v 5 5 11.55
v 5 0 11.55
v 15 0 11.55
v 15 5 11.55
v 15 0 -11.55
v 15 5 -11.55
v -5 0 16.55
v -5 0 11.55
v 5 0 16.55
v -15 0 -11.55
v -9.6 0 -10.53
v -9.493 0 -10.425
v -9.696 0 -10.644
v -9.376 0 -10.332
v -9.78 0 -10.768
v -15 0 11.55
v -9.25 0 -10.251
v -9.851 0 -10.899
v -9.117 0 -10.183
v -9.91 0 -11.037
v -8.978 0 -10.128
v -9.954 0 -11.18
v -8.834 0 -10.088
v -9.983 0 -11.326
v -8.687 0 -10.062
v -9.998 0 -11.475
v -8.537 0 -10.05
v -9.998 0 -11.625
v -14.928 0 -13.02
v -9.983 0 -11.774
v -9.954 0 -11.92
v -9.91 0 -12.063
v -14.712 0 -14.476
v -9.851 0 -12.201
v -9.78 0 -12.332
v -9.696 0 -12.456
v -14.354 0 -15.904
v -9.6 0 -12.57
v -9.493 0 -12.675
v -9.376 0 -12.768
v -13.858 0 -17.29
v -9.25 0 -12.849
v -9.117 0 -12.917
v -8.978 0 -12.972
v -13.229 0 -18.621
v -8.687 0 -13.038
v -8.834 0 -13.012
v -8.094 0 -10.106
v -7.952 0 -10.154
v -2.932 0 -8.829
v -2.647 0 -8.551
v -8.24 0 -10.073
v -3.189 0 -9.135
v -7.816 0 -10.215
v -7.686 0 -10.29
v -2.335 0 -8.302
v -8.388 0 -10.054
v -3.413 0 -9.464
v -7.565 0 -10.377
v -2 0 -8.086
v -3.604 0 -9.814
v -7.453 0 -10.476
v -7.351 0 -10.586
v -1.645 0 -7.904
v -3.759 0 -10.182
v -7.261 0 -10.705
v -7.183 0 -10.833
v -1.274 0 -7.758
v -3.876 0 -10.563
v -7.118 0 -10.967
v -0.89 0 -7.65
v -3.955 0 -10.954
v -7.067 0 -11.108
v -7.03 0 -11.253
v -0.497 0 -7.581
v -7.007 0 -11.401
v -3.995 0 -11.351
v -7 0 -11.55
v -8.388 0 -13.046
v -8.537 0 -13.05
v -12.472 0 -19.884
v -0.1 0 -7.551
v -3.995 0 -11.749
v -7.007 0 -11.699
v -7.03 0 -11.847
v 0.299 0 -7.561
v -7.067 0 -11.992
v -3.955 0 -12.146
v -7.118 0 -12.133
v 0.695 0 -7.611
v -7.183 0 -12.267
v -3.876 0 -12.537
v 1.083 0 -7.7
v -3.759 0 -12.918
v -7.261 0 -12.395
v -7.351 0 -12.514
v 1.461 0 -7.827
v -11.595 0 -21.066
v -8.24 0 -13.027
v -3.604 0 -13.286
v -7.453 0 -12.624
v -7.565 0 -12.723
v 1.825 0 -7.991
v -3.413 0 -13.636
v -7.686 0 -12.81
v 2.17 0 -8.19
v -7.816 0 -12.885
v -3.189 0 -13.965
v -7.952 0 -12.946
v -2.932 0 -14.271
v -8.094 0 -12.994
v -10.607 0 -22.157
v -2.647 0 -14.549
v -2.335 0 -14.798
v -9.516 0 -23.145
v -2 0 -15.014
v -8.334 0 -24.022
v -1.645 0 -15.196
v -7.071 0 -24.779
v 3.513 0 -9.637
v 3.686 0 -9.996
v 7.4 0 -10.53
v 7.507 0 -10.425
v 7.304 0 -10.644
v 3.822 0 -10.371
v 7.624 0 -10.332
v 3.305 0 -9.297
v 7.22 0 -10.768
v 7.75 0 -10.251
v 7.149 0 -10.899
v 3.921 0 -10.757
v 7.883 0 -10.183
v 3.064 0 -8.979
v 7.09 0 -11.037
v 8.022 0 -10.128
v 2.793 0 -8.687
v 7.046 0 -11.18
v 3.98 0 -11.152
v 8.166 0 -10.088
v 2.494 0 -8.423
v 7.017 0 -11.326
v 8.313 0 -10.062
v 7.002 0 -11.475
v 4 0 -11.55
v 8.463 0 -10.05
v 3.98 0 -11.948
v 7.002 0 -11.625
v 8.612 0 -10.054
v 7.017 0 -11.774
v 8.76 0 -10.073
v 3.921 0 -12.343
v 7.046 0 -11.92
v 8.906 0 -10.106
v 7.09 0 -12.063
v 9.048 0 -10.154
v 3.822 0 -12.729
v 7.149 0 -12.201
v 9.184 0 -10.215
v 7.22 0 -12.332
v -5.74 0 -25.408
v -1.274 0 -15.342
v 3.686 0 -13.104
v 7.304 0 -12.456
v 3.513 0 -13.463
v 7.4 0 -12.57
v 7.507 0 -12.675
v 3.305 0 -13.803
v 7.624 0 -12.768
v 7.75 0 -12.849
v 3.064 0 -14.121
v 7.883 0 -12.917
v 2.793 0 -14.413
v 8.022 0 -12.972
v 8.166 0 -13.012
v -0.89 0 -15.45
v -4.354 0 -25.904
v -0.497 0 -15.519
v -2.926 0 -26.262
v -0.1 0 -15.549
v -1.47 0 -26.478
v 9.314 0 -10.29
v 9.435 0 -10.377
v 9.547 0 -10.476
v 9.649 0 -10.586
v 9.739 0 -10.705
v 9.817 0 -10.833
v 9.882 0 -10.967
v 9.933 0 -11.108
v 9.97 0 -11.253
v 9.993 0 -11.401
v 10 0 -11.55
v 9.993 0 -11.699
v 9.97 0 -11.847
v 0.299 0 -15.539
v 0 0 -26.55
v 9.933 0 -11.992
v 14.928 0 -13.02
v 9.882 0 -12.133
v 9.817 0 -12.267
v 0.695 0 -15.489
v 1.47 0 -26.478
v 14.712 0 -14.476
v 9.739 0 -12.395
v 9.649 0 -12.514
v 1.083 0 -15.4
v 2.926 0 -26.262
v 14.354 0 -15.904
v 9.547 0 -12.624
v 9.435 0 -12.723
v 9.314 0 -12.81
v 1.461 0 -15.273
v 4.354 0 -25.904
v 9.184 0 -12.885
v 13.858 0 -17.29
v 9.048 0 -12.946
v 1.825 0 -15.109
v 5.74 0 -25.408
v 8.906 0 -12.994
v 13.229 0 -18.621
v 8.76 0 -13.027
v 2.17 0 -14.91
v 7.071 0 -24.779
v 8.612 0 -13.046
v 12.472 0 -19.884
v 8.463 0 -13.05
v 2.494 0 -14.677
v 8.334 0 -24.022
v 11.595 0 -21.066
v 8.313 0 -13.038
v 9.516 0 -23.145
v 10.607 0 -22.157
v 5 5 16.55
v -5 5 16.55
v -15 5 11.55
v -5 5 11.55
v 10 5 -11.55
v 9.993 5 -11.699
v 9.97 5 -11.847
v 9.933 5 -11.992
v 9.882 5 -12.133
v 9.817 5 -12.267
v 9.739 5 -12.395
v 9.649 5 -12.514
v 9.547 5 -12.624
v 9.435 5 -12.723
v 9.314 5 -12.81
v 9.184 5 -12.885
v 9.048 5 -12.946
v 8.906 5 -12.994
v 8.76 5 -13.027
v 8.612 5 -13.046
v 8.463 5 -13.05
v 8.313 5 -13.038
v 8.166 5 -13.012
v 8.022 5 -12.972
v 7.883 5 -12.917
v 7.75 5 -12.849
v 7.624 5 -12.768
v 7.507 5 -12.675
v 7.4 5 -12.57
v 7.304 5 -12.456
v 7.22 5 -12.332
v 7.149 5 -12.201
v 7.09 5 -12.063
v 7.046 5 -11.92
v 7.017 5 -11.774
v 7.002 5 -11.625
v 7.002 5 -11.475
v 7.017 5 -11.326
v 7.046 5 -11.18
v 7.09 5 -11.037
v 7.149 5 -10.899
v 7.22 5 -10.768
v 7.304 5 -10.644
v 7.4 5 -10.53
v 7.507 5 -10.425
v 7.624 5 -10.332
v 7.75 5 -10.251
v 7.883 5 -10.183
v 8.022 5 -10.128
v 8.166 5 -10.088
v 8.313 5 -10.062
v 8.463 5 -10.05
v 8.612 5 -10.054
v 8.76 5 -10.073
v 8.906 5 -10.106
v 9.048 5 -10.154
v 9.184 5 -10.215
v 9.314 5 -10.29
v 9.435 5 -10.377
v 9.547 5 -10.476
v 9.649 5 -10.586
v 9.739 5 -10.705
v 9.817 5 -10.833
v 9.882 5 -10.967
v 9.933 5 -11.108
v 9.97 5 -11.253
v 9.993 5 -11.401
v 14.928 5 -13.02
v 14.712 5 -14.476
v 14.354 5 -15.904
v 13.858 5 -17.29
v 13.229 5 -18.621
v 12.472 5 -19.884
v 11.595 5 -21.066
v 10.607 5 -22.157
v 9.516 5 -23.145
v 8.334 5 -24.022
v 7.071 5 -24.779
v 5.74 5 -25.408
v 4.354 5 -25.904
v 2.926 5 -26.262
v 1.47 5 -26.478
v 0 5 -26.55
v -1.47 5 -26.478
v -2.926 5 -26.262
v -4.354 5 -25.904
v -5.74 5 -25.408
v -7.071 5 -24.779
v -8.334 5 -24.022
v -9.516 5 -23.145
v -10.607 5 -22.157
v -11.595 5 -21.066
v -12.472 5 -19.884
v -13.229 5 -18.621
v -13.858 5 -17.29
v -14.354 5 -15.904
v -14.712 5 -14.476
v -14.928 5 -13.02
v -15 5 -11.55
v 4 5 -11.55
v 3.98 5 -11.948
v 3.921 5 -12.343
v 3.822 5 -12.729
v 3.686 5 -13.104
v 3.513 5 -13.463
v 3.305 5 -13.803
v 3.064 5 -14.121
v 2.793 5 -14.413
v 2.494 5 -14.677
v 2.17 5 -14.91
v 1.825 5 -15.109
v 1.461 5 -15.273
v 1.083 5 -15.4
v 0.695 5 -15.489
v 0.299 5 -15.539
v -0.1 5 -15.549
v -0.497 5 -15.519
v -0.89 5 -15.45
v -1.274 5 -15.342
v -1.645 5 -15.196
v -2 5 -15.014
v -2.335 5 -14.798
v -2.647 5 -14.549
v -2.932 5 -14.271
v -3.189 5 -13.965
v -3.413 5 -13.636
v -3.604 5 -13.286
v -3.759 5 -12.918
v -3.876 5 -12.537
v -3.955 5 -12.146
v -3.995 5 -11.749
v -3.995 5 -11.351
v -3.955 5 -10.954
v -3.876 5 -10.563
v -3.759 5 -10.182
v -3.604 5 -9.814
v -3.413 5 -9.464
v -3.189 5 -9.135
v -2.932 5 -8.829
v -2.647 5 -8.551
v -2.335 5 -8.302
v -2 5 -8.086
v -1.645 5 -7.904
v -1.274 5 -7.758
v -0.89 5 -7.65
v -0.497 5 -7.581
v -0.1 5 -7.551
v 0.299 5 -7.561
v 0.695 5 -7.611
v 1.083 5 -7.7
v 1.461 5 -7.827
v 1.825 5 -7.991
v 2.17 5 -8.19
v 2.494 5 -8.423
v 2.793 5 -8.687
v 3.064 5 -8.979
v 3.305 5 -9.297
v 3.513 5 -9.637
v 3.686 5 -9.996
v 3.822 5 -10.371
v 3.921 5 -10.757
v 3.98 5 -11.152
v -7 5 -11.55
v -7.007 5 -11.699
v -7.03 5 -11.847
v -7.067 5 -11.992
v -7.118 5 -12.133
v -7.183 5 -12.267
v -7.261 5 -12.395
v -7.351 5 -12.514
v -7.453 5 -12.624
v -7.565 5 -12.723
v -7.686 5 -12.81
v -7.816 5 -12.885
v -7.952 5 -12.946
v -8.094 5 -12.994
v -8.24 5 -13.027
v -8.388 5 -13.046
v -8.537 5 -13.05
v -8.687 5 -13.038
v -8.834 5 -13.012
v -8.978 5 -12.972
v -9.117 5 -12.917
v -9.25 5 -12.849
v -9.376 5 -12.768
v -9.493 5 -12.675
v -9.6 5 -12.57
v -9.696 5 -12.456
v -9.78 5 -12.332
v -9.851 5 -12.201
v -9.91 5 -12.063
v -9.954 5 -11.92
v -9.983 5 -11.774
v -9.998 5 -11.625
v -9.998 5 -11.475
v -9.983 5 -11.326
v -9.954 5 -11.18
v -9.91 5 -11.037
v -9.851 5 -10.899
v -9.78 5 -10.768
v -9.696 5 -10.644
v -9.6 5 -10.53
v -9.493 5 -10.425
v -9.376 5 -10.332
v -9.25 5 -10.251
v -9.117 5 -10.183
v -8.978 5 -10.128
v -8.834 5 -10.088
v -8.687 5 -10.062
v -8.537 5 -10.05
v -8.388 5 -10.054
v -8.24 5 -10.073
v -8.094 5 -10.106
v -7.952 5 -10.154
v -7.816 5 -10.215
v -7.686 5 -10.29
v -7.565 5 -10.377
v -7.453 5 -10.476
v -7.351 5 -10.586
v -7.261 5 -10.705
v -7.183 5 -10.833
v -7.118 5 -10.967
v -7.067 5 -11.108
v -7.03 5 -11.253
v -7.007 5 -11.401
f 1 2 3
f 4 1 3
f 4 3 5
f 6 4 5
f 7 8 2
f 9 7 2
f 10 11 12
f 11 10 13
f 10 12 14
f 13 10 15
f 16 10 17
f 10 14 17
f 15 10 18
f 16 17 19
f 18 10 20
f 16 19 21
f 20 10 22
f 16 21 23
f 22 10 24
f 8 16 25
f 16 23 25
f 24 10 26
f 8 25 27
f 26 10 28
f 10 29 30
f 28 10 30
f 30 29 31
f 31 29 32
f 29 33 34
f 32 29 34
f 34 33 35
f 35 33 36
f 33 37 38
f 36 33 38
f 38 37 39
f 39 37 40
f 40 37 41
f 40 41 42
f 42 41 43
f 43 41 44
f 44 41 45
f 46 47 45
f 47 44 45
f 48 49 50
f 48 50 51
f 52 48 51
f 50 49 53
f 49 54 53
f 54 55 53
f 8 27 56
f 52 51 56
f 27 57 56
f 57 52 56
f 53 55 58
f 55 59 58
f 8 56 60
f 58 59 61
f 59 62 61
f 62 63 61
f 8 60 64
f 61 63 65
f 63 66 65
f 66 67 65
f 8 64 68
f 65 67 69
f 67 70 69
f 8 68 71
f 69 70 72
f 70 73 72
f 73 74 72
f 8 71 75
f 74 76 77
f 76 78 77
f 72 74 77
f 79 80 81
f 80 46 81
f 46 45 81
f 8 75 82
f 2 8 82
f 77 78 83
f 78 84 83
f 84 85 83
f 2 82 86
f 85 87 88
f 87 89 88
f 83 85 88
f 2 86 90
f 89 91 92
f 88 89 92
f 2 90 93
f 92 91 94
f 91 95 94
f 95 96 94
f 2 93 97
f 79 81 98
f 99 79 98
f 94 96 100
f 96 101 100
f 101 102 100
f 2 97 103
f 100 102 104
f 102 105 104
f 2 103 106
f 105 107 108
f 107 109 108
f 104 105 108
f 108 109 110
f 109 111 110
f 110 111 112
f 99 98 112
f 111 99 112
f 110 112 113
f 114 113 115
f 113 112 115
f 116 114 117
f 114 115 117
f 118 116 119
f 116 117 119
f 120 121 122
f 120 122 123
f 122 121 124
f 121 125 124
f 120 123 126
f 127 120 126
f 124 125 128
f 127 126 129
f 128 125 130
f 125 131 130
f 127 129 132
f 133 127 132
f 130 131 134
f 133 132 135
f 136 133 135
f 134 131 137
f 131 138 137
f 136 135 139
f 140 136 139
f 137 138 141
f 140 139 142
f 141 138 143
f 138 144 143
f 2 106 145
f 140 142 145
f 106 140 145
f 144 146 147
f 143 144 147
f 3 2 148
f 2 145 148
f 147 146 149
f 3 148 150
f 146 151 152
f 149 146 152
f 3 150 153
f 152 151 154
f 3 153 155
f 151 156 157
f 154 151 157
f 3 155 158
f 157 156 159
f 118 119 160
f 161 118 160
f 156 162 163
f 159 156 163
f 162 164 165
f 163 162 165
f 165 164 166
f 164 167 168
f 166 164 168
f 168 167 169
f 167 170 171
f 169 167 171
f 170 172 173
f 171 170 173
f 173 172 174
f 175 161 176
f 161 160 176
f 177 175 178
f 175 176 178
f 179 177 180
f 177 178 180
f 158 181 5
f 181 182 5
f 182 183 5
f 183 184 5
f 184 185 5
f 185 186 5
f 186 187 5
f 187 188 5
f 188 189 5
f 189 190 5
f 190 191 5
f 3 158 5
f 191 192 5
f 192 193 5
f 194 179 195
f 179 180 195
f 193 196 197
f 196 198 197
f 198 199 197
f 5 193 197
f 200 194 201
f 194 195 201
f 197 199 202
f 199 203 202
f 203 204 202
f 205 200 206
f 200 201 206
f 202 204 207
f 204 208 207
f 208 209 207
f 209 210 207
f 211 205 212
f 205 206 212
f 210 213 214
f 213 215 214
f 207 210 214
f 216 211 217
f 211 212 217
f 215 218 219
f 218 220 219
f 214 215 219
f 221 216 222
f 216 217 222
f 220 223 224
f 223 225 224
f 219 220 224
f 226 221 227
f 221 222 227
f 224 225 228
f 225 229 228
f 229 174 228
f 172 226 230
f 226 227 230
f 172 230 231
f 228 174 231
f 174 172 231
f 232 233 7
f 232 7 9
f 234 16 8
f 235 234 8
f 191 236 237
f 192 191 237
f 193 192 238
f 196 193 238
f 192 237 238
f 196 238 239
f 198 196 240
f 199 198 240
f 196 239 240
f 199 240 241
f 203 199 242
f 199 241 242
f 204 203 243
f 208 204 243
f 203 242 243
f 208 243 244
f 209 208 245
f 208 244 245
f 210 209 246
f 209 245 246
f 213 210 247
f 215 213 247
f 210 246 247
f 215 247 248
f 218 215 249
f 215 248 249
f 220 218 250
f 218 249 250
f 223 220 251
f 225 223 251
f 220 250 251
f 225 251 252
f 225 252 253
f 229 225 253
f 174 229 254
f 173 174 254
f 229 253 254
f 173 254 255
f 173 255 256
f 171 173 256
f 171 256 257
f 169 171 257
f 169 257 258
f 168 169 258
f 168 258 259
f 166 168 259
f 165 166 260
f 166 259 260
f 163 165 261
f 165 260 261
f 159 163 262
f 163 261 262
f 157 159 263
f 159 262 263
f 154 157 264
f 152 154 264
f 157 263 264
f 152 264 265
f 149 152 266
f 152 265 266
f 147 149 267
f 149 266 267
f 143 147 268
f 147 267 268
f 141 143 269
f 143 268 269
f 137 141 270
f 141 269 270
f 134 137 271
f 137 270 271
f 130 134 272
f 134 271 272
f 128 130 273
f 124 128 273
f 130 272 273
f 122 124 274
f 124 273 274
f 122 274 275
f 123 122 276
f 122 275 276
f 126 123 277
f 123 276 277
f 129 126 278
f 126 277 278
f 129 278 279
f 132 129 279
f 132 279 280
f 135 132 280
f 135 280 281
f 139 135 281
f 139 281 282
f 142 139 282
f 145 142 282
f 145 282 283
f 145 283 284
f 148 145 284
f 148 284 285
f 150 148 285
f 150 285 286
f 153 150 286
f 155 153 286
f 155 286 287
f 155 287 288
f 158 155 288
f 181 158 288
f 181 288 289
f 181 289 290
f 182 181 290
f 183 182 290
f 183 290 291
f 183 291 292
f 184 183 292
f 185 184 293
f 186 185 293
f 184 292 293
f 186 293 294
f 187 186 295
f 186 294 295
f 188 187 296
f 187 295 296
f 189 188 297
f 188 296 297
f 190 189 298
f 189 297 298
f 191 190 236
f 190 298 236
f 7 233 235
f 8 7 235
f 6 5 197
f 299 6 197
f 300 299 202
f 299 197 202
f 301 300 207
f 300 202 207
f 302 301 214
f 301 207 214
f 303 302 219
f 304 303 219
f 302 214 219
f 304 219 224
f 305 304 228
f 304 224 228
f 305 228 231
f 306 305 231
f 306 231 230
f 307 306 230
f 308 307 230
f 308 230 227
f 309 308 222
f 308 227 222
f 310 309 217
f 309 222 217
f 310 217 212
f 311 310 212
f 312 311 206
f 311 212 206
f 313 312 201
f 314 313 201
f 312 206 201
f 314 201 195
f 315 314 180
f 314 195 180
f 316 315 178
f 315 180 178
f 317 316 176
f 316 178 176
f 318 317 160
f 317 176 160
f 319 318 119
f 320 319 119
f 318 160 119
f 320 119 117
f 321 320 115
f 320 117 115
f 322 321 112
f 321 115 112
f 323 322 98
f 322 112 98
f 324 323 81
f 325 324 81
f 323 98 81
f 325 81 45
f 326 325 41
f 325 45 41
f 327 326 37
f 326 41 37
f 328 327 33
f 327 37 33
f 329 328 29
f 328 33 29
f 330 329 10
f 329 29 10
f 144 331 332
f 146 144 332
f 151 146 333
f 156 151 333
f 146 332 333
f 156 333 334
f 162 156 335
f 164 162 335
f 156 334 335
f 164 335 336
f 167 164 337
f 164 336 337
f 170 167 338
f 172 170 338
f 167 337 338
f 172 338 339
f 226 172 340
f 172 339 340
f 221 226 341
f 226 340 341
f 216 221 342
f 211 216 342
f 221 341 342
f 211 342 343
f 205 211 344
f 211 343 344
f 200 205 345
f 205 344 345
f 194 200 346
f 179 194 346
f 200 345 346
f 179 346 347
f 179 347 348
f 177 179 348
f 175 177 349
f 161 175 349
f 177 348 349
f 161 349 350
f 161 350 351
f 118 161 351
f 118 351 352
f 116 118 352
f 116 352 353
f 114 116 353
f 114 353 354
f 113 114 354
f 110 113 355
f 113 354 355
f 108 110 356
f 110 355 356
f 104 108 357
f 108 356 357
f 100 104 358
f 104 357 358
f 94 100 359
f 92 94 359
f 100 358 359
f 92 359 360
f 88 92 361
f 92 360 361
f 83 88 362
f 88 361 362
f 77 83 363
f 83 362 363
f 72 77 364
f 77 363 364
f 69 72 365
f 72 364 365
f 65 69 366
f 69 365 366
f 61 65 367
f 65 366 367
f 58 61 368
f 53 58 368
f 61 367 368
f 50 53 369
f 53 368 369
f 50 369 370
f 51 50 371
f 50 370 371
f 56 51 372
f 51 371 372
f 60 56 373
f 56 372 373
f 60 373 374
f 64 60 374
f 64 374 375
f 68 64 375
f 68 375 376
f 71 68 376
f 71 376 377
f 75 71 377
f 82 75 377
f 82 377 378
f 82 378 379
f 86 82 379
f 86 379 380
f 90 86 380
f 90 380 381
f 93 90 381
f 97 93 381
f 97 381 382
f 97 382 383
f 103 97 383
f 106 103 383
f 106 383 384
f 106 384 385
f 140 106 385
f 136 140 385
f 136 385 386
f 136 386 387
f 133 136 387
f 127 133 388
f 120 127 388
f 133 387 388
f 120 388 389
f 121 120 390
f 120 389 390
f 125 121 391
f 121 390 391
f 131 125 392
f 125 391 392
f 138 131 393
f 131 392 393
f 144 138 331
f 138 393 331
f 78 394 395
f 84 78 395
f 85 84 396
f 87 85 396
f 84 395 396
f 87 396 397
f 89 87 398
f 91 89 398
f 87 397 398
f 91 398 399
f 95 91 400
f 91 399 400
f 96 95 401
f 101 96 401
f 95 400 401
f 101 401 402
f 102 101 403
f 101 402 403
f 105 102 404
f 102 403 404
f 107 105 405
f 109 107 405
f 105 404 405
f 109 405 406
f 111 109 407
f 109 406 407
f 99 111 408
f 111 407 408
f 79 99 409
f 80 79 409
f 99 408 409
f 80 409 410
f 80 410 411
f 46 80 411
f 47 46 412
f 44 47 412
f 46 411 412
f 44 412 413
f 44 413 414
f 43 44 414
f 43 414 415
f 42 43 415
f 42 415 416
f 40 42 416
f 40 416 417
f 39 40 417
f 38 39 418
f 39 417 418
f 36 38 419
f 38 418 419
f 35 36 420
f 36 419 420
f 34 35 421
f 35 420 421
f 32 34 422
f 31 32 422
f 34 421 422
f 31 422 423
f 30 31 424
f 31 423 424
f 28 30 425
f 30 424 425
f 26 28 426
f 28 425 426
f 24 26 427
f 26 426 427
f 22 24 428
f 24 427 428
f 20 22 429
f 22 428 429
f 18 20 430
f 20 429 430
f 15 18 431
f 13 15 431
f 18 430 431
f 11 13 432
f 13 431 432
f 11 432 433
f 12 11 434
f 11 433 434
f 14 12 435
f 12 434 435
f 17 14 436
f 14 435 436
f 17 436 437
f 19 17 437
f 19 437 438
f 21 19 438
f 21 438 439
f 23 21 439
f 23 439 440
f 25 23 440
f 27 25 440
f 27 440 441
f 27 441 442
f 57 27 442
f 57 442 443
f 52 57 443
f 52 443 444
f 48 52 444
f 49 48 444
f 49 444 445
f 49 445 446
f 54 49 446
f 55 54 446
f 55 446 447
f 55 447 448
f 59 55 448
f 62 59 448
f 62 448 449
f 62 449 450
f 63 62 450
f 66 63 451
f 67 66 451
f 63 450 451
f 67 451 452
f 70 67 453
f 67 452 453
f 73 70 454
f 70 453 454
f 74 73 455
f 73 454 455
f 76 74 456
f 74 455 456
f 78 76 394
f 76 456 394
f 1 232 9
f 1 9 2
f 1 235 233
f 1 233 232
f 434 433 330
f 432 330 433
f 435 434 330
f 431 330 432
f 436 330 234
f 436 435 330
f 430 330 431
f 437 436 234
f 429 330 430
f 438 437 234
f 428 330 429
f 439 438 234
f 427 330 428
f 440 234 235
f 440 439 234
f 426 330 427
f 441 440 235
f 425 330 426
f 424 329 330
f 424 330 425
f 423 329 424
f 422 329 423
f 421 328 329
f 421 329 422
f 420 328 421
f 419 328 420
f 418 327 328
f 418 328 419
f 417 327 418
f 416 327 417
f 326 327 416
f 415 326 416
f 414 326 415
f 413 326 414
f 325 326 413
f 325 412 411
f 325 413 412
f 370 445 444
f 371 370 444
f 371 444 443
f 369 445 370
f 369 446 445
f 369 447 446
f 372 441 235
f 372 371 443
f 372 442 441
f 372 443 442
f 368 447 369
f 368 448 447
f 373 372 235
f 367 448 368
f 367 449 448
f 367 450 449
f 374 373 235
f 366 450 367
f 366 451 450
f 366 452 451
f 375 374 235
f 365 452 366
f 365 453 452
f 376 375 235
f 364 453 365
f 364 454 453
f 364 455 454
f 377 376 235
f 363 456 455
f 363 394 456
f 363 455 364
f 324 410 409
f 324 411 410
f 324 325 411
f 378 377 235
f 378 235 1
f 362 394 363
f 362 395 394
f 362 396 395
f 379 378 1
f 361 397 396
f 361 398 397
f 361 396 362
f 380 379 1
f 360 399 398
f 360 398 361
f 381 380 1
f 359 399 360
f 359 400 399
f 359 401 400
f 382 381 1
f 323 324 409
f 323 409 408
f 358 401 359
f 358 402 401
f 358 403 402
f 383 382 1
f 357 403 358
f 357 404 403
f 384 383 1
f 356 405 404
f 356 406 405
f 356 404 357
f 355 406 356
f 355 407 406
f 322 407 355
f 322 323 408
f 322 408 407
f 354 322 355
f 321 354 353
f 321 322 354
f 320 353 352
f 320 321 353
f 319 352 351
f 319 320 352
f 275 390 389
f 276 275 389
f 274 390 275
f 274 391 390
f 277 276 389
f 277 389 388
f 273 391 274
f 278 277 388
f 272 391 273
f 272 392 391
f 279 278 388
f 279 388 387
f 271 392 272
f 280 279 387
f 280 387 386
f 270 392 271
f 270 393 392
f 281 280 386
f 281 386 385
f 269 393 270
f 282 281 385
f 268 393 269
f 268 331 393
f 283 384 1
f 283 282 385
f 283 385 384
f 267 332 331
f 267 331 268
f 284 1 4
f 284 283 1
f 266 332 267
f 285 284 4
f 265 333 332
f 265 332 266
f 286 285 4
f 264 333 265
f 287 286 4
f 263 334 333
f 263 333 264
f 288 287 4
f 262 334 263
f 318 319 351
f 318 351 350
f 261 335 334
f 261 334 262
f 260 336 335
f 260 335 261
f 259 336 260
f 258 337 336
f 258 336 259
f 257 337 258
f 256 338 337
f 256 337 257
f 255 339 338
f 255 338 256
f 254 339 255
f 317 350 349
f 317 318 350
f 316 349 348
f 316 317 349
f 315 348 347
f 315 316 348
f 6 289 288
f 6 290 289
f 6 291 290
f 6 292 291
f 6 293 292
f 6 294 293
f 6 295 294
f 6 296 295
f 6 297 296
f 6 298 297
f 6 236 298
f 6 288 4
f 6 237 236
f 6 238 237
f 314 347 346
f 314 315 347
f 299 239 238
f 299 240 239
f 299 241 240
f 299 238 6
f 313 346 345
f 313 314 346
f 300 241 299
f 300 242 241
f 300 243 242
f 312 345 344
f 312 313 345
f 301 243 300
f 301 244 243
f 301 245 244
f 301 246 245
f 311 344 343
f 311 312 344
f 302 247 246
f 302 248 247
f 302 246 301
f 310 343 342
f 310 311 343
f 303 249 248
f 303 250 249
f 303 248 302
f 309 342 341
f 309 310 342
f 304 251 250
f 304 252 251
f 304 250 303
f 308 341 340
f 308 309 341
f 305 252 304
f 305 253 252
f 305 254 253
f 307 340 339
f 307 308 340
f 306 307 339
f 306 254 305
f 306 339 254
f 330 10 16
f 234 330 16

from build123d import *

# Parameters (mm, degrees)
EXTRUDE_1_DEPTH = 5
SKETCH_2_R      = 12.5
SKETCH_2_R_2    = 1.5
SKETCH_2_R_3    = 4
EXTRUDE_2_DEPTH = 5
SKETCH_3_W      = 10
SKETCH_3_H      = 5
EXTRUDE_3_DEPTH = 5


with BuildPart() as part:
    # 草图1 → 凸台-拉伸1 (new body)
    with BuildSketch(Plane(origin=(0, 0, 0), x_dir=(1, 0, 0), z_dir=(0, 1, 0))):
        with BuildLine():
            ThreePointArc((15, 11.55), (0, 26.55), (-15, 11.55))
            Line((-15, 11.55), (-12.5, 11.55))
            ThreePointArc((-12.5, 11.55), (0, 24.05), (12.5, 11.55))
            Line((12.5, 11.55), (15, 11.55))
        make_face()
        with BuildLine():
            Line((-12.5, 11.55), (-15, 11.55))
            ThreePointArc((-15, 11.55), (0, -3.45), (15, 11.55))
            Line((15, 11.55), (12.5, 11.55))
            ThreePointArc((12.5, 11.55), (0, -0.95), (-12.5, 11.55))
        make_face()
        with BuildLine():
            ThreePointArc((15, 11.55), (0, 26.55), (-15, 11.55))
            Line((-15, 11.55), (-12.5, 11.55))
            ThreePointArc((-12.5, 11.55), (0, 24.05), (12.5, 11.55))
            Line((12.5, 11.55), (15, 11.55))
        make_face()
        with BuildLine():
            Line((-12.5, 11.55), (-15, 11.55))
            ThreePointArc((-15, 11.55), (0, -3.45), (15, 11.55))
            Line((15, 11.55), (12.5, 11.55))
            ThreePointArc((12.5, 11.55), (0, -0.95), (-12.5, 11.55))
        make_face()
        with BuildLine():
            Line((-15, 11.55), (-15, -11.55))
            Line((-15, -11.55), (15, -11.55))
            Line((15, -11.55), (15, 11.55))
            ThreePointArc((15, 11.55), (0, -3.45), (-15, 11.55))
        make_face()
    extrude(amount=EXTRUDE_1_DEPTH)

    # 草图2 → 凸台-拉伸2 (add)
    with BuildSketch(Plane(origin=(0, 5, 0), x_dir=(1, 0, 0), z_dir=(0, 1, 0))):
        with Locations((0, 11.55)):
            Circle(SKETCH_2_R)
        with Locations((-8.5, 11.55)):
            Circle(SKETCH_2_R_2, mode=Mode.SUBTRACT)
        with Locations((8.5, 11.55)):
            Circle(SKETCH_2_R_2, mode=Mode.SUBTRACT)
        with Locations((0, 11.55)):
            Circle(SKETCH_2_R_3, mode=Mode.SUBTRACT)
    extrude(amount=-EXTRUDE_2_DEPTH)

    # 草图3 → 凸台-拉伸3 (add)
    with BuildSketch(Plane(origin=(0, 5, 0), x_dir=(1, 0, 0), z_dir=(0, 1, 0))):
        with Locations((0, -14.05)):
            Rectangle(SKETCH_3_W, SKETCH_3_H)
    extrude(amount=-EXTRUDE_3_DEPTH)


solid = part.part
